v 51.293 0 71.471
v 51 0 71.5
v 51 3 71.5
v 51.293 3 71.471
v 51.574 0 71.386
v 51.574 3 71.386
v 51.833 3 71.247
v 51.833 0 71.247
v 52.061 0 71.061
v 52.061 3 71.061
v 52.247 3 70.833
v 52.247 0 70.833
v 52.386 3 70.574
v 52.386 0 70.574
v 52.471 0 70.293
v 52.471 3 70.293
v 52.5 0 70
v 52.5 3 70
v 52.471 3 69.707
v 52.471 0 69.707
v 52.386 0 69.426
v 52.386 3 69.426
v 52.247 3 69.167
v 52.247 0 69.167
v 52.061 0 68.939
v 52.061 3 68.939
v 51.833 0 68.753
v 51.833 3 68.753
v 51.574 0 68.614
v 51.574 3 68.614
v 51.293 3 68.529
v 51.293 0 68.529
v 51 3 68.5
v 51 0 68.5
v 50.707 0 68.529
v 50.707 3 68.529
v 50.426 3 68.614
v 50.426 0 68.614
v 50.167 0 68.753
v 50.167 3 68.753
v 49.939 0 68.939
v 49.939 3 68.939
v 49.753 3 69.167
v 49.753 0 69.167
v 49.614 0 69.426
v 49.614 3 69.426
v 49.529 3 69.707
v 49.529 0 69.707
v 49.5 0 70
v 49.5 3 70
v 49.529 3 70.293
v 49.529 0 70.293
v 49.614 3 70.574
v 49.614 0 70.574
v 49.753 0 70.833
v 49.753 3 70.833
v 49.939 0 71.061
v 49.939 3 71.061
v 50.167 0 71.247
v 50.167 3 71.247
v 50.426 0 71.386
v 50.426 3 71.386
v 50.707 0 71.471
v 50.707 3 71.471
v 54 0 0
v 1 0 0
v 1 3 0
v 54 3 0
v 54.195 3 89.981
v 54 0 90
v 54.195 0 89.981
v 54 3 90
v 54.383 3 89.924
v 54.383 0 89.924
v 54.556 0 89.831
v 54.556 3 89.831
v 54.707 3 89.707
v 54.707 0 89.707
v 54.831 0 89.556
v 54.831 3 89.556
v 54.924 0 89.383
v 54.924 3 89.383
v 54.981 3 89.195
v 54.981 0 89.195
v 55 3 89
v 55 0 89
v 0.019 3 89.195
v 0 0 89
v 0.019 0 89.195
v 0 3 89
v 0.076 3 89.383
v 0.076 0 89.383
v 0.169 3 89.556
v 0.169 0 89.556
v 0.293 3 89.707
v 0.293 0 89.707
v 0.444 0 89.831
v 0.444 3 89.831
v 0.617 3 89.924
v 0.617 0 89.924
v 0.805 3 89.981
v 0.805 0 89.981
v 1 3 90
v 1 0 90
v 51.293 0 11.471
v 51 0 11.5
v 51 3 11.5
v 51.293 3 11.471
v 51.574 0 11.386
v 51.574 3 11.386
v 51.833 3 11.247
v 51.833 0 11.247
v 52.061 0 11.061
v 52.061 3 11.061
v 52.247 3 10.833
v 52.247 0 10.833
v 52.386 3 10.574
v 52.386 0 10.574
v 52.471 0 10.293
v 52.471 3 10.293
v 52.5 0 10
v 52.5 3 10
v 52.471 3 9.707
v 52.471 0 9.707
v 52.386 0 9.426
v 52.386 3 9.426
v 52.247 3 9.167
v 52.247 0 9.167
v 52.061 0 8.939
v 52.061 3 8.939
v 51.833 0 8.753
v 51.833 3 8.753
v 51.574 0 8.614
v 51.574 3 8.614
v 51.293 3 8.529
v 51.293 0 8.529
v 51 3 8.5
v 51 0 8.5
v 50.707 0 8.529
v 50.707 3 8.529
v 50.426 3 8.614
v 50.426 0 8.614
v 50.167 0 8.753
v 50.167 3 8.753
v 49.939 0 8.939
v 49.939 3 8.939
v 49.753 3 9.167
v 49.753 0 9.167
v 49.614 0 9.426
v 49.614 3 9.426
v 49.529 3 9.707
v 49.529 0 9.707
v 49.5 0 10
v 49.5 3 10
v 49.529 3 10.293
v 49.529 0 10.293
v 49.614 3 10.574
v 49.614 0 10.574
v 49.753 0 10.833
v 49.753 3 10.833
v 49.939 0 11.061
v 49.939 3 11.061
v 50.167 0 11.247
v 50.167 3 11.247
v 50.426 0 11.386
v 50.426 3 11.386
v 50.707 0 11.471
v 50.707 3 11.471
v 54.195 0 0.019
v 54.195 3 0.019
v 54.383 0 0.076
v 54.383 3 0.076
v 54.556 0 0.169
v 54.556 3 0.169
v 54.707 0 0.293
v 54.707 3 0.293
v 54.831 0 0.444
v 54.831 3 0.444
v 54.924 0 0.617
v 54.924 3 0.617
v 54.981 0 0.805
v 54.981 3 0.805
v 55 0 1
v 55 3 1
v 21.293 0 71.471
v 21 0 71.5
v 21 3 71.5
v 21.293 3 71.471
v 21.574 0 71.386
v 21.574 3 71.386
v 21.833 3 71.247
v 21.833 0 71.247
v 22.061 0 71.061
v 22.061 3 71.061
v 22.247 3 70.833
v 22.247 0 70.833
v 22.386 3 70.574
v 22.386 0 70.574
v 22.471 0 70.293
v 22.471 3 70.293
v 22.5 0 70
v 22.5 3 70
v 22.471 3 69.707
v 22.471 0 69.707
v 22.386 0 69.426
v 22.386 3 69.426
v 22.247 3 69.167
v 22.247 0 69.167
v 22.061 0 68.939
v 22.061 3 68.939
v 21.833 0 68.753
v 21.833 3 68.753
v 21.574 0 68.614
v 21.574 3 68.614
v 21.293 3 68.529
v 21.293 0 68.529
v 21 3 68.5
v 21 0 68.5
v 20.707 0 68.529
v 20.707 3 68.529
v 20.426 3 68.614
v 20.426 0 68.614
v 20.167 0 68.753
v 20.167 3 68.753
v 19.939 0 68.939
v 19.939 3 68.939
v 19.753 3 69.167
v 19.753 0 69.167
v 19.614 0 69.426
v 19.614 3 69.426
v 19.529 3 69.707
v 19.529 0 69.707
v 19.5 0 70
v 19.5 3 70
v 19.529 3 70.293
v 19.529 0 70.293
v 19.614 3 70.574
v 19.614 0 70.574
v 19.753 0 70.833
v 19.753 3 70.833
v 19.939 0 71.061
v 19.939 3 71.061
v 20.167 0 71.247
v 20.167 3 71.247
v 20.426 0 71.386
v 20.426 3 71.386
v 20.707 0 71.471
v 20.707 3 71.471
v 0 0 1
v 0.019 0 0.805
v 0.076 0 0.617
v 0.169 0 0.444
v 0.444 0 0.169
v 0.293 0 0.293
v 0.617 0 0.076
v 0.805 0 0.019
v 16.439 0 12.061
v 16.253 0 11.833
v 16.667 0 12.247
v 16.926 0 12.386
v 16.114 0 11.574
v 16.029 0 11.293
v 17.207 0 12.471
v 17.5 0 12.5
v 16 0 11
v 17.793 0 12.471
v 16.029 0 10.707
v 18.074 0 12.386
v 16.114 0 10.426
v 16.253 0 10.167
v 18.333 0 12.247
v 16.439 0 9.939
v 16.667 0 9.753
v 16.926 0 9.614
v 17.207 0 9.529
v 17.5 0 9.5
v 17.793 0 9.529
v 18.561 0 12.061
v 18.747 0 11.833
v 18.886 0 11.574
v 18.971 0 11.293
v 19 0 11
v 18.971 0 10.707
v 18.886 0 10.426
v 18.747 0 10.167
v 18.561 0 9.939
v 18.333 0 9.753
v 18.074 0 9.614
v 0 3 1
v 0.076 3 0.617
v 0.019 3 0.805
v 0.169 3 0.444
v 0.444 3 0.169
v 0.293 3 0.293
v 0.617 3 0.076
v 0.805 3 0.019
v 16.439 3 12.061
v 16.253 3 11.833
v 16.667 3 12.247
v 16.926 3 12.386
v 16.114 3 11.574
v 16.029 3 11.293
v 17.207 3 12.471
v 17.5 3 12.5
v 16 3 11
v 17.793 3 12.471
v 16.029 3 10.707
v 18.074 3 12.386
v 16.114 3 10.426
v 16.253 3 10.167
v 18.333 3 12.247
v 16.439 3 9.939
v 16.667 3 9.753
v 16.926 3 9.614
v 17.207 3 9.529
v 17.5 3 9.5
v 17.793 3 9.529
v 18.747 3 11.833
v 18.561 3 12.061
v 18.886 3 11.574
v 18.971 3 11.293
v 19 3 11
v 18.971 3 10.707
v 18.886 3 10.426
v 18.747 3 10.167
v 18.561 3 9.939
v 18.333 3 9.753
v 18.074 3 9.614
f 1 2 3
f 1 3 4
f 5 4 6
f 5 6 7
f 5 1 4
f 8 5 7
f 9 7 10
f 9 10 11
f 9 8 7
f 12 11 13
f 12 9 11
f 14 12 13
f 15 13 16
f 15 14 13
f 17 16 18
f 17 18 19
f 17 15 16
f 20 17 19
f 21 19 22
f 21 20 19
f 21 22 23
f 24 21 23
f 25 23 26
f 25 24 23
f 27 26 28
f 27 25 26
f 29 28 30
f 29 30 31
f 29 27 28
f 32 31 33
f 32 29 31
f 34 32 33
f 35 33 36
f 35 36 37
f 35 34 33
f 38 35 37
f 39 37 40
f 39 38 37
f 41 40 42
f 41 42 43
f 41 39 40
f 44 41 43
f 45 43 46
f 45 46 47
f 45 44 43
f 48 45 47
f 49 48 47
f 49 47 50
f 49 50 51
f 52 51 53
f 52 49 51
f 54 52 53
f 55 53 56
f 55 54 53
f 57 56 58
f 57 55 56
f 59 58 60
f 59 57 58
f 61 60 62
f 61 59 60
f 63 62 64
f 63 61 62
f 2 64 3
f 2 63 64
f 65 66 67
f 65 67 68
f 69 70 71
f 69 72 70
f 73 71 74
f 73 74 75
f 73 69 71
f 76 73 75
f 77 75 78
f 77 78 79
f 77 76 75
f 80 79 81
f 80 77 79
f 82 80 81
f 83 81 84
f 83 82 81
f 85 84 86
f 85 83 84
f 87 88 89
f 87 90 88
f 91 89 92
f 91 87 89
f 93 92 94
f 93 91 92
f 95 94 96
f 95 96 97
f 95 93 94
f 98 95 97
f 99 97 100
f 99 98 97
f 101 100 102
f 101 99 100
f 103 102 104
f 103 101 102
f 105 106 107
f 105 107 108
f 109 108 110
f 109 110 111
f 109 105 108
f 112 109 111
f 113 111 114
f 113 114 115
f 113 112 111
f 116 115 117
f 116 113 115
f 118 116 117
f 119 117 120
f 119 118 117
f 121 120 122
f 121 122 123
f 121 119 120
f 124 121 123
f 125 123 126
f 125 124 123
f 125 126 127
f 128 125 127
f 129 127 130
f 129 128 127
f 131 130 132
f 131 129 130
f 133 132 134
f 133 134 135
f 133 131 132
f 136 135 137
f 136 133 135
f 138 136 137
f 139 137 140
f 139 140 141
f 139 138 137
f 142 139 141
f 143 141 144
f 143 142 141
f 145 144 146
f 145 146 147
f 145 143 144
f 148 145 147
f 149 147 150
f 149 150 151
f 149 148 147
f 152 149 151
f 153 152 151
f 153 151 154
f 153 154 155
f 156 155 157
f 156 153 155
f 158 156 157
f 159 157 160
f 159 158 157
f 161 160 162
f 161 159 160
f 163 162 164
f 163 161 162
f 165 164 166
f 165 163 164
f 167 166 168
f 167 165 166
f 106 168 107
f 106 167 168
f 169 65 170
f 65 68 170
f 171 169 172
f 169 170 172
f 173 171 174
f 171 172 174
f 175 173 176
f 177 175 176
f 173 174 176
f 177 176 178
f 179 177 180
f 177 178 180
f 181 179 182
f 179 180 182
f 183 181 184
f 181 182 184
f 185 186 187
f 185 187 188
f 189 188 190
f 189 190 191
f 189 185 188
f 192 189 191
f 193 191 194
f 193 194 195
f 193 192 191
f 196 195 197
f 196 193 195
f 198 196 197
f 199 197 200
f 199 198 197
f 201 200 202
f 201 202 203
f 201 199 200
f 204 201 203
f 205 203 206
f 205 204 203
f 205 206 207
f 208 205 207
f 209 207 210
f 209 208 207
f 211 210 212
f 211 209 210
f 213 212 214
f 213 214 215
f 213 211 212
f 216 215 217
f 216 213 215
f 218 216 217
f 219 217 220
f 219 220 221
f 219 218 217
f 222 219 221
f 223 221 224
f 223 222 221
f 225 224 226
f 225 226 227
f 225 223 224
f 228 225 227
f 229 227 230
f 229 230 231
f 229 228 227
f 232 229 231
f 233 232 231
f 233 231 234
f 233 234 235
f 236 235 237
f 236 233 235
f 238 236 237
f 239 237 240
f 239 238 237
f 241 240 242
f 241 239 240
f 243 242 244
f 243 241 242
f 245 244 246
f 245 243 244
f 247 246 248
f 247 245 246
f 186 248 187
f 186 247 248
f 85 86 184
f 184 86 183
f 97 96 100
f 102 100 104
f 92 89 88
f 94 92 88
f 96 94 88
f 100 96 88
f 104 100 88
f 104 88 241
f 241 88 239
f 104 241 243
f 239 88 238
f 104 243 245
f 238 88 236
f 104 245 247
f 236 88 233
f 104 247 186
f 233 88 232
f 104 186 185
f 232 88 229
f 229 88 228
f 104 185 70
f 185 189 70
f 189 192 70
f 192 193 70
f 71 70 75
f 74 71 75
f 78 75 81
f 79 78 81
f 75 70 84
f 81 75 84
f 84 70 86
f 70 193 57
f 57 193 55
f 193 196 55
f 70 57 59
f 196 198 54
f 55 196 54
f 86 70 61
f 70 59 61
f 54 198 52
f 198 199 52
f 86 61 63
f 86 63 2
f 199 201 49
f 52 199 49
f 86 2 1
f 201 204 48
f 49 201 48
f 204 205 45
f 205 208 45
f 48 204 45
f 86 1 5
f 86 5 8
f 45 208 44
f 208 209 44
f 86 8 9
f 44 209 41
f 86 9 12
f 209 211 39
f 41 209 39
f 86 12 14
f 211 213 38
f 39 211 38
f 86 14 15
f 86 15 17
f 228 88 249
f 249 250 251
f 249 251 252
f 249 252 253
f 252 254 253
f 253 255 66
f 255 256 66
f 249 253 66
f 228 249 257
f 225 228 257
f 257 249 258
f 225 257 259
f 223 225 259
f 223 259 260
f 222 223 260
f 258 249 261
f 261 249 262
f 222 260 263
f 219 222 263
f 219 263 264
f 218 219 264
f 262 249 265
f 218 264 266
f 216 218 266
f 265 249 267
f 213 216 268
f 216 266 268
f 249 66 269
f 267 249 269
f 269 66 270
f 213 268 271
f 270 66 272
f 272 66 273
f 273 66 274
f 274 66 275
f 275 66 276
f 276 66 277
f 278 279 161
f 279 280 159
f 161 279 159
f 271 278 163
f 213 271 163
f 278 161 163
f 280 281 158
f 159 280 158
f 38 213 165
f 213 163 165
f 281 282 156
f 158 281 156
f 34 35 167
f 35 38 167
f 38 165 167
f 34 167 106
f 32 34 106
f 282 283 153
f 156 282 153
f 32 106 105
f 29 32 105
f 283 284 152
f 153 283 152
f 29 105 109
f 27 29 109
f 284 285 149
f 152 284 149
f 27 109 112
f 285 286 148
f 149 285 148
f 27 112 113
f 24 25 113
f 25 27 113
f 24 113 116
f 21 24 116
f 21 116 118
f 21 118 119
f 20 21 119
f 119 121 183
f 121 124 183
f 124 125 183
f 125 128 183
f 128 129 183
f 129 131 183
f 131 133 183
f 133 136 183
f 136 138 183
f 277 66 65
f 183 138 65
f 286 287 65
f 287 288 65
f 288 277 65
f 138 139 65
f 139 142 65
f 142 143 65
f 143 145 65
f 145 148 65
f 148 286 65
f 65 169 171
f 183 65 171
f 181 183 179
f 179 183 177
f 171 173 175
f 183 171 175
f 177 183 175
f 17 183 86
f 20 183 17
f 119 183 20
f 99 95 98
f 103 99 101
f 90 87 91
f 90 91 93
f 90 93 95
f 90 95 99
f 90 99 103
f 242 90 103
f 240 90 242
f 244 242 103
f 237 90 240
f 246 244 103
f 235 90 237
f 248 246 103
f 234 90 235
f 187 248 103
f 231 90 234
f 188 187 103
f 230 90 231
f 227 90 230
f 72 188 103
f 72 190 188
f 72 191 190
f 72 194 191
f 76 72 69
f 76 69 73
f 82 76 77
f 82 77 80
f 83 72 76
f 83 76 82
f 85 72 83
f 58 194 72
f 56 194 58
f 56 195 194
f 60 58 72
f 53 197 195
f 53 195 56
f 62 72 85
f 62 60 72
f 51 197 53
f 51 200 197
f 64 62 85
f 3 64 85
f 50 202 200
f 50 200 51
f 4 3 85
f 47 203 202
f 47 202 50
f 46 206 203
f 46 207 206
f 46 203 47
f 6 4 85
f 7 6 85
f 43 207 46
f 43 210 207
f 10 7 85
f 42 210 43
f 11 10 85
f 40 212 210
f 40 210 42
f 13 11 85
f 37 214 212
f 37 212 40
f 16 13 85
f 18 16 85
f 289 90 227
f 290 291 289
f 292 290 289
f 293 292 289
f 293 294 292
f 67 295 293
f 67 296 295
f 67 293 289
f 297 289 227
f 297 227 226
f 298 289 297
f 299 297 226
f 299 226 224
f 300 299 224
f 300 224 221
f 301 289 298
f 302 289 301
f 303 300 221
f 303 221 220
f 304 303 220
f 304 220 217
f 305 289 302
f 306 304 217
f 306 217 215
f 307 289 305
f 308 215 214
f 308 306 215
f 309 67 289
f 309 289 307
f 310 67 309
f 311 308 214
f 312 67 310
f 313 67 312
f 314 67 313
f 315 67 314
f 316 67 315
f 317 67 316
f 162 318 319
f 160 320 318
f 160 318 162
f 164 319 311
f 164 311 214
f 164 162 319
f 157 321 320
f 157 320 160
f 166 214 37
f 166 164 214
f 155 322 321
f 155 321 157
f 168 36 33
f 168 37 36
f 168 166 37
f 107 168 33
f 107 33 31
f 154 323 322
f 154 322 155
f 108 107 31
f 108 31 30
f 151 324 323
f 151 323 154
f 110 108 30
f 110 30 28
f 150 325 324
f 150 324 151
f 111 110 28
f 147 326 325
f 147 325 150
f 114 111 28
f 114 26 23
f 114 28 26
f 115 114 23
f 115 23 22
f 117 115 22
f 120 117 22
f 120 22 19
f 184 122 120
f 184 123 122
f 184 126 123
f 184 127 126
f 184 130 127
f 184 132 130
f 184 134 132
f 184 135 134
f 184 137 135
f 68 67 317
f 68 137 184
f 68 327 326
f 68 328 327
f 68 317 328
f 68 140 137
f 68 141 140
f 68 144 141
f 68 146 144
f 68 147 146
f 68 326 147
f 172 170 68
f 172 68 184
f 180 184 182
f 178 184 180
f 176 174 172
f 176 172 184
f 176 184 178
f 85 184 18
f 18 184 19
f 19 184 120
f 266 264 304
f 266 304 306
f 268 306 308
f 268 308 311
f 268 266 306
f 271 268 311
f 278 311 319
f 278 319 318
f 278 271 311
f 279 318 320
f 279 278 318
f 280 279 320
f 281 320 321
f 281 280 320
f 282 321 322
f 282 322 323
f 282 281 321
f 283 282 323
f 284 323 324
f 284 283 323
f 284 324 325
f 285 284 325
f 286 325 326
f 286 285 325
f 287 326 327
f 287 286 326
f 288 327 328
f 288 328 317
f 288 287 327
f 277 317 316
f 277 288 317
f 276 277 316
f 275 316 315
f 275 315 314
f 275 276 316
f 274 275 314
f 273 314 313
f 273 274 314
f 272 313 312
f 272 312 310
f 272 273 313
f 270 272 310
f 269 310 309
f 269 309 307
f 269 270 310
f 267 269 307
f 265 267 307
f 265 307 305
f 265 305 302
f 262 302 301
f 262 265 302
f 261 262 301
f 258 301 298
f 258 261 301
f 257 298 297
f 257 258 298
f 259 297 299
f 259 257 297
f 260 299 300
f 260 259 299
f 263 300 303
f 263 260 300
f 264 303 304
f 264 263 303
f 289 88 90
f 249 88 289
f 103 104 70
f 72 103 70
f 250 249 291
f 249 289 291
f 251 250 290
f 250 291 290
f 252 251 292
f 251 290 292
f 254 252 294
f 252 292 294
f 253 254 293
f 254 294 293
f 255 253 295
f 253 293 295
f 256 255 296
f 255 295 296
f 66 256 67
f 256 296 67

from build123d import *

# Parameters (mm, degrees)
SKETCH_1_W      = 55
SKETCH_1_H      = 90
SKETCH_1_R      = 1.5
EXTRUDE_1_DEPTH = 3
FILLET_1_R      = 1


with BuildPart() as part:
    # 草图1 → 凸台-拉伸1 (new body)
    with BuildSketch(Plane(origin=(0, 0, 0), x_dir=(1, 0, 0), z_dir=(0, 1, 0))):
        with Locations((27.5, -45)):
            Rectangle(SKETCH_1_W, SKETCH_1_H)
        with Locations(Location((17.5, -11, 0), (0, 0, 270))):
            Circle(SKETCH_1_R, mode=Mode.SUBTRACT)
        with Locations(Location((51, -10, 0), (0, 0, 270))):
            Circle(SKETCH_1_R, mode=Mode.SUBTRACT)
        with Locations(Location((21, -70, 0), (0, 0, 270))):
            Circle(SKETCH_1_R, mode=Mode.SUBTRACT)
        with Locations(Location((51, -70, 0), (0, 0, 270))):
            Circle(SKETCH_1_R, mode=Mode.SUBTRACT)
    extrude(amount=EXTRUDE_1_DEPTH)

    # 圆角1
    fillet_1_edges = [part.edges().sort_by_distance(p)[0] for p in [
        (0, 1.5, 0),
        (55, 1.5, 0),
        (55, 1.5, 90),
        (0, 1.5, 90),
    ]]
    fillet(fillet_1_edges, radius=FILLET_1_R)


solid = part.part
